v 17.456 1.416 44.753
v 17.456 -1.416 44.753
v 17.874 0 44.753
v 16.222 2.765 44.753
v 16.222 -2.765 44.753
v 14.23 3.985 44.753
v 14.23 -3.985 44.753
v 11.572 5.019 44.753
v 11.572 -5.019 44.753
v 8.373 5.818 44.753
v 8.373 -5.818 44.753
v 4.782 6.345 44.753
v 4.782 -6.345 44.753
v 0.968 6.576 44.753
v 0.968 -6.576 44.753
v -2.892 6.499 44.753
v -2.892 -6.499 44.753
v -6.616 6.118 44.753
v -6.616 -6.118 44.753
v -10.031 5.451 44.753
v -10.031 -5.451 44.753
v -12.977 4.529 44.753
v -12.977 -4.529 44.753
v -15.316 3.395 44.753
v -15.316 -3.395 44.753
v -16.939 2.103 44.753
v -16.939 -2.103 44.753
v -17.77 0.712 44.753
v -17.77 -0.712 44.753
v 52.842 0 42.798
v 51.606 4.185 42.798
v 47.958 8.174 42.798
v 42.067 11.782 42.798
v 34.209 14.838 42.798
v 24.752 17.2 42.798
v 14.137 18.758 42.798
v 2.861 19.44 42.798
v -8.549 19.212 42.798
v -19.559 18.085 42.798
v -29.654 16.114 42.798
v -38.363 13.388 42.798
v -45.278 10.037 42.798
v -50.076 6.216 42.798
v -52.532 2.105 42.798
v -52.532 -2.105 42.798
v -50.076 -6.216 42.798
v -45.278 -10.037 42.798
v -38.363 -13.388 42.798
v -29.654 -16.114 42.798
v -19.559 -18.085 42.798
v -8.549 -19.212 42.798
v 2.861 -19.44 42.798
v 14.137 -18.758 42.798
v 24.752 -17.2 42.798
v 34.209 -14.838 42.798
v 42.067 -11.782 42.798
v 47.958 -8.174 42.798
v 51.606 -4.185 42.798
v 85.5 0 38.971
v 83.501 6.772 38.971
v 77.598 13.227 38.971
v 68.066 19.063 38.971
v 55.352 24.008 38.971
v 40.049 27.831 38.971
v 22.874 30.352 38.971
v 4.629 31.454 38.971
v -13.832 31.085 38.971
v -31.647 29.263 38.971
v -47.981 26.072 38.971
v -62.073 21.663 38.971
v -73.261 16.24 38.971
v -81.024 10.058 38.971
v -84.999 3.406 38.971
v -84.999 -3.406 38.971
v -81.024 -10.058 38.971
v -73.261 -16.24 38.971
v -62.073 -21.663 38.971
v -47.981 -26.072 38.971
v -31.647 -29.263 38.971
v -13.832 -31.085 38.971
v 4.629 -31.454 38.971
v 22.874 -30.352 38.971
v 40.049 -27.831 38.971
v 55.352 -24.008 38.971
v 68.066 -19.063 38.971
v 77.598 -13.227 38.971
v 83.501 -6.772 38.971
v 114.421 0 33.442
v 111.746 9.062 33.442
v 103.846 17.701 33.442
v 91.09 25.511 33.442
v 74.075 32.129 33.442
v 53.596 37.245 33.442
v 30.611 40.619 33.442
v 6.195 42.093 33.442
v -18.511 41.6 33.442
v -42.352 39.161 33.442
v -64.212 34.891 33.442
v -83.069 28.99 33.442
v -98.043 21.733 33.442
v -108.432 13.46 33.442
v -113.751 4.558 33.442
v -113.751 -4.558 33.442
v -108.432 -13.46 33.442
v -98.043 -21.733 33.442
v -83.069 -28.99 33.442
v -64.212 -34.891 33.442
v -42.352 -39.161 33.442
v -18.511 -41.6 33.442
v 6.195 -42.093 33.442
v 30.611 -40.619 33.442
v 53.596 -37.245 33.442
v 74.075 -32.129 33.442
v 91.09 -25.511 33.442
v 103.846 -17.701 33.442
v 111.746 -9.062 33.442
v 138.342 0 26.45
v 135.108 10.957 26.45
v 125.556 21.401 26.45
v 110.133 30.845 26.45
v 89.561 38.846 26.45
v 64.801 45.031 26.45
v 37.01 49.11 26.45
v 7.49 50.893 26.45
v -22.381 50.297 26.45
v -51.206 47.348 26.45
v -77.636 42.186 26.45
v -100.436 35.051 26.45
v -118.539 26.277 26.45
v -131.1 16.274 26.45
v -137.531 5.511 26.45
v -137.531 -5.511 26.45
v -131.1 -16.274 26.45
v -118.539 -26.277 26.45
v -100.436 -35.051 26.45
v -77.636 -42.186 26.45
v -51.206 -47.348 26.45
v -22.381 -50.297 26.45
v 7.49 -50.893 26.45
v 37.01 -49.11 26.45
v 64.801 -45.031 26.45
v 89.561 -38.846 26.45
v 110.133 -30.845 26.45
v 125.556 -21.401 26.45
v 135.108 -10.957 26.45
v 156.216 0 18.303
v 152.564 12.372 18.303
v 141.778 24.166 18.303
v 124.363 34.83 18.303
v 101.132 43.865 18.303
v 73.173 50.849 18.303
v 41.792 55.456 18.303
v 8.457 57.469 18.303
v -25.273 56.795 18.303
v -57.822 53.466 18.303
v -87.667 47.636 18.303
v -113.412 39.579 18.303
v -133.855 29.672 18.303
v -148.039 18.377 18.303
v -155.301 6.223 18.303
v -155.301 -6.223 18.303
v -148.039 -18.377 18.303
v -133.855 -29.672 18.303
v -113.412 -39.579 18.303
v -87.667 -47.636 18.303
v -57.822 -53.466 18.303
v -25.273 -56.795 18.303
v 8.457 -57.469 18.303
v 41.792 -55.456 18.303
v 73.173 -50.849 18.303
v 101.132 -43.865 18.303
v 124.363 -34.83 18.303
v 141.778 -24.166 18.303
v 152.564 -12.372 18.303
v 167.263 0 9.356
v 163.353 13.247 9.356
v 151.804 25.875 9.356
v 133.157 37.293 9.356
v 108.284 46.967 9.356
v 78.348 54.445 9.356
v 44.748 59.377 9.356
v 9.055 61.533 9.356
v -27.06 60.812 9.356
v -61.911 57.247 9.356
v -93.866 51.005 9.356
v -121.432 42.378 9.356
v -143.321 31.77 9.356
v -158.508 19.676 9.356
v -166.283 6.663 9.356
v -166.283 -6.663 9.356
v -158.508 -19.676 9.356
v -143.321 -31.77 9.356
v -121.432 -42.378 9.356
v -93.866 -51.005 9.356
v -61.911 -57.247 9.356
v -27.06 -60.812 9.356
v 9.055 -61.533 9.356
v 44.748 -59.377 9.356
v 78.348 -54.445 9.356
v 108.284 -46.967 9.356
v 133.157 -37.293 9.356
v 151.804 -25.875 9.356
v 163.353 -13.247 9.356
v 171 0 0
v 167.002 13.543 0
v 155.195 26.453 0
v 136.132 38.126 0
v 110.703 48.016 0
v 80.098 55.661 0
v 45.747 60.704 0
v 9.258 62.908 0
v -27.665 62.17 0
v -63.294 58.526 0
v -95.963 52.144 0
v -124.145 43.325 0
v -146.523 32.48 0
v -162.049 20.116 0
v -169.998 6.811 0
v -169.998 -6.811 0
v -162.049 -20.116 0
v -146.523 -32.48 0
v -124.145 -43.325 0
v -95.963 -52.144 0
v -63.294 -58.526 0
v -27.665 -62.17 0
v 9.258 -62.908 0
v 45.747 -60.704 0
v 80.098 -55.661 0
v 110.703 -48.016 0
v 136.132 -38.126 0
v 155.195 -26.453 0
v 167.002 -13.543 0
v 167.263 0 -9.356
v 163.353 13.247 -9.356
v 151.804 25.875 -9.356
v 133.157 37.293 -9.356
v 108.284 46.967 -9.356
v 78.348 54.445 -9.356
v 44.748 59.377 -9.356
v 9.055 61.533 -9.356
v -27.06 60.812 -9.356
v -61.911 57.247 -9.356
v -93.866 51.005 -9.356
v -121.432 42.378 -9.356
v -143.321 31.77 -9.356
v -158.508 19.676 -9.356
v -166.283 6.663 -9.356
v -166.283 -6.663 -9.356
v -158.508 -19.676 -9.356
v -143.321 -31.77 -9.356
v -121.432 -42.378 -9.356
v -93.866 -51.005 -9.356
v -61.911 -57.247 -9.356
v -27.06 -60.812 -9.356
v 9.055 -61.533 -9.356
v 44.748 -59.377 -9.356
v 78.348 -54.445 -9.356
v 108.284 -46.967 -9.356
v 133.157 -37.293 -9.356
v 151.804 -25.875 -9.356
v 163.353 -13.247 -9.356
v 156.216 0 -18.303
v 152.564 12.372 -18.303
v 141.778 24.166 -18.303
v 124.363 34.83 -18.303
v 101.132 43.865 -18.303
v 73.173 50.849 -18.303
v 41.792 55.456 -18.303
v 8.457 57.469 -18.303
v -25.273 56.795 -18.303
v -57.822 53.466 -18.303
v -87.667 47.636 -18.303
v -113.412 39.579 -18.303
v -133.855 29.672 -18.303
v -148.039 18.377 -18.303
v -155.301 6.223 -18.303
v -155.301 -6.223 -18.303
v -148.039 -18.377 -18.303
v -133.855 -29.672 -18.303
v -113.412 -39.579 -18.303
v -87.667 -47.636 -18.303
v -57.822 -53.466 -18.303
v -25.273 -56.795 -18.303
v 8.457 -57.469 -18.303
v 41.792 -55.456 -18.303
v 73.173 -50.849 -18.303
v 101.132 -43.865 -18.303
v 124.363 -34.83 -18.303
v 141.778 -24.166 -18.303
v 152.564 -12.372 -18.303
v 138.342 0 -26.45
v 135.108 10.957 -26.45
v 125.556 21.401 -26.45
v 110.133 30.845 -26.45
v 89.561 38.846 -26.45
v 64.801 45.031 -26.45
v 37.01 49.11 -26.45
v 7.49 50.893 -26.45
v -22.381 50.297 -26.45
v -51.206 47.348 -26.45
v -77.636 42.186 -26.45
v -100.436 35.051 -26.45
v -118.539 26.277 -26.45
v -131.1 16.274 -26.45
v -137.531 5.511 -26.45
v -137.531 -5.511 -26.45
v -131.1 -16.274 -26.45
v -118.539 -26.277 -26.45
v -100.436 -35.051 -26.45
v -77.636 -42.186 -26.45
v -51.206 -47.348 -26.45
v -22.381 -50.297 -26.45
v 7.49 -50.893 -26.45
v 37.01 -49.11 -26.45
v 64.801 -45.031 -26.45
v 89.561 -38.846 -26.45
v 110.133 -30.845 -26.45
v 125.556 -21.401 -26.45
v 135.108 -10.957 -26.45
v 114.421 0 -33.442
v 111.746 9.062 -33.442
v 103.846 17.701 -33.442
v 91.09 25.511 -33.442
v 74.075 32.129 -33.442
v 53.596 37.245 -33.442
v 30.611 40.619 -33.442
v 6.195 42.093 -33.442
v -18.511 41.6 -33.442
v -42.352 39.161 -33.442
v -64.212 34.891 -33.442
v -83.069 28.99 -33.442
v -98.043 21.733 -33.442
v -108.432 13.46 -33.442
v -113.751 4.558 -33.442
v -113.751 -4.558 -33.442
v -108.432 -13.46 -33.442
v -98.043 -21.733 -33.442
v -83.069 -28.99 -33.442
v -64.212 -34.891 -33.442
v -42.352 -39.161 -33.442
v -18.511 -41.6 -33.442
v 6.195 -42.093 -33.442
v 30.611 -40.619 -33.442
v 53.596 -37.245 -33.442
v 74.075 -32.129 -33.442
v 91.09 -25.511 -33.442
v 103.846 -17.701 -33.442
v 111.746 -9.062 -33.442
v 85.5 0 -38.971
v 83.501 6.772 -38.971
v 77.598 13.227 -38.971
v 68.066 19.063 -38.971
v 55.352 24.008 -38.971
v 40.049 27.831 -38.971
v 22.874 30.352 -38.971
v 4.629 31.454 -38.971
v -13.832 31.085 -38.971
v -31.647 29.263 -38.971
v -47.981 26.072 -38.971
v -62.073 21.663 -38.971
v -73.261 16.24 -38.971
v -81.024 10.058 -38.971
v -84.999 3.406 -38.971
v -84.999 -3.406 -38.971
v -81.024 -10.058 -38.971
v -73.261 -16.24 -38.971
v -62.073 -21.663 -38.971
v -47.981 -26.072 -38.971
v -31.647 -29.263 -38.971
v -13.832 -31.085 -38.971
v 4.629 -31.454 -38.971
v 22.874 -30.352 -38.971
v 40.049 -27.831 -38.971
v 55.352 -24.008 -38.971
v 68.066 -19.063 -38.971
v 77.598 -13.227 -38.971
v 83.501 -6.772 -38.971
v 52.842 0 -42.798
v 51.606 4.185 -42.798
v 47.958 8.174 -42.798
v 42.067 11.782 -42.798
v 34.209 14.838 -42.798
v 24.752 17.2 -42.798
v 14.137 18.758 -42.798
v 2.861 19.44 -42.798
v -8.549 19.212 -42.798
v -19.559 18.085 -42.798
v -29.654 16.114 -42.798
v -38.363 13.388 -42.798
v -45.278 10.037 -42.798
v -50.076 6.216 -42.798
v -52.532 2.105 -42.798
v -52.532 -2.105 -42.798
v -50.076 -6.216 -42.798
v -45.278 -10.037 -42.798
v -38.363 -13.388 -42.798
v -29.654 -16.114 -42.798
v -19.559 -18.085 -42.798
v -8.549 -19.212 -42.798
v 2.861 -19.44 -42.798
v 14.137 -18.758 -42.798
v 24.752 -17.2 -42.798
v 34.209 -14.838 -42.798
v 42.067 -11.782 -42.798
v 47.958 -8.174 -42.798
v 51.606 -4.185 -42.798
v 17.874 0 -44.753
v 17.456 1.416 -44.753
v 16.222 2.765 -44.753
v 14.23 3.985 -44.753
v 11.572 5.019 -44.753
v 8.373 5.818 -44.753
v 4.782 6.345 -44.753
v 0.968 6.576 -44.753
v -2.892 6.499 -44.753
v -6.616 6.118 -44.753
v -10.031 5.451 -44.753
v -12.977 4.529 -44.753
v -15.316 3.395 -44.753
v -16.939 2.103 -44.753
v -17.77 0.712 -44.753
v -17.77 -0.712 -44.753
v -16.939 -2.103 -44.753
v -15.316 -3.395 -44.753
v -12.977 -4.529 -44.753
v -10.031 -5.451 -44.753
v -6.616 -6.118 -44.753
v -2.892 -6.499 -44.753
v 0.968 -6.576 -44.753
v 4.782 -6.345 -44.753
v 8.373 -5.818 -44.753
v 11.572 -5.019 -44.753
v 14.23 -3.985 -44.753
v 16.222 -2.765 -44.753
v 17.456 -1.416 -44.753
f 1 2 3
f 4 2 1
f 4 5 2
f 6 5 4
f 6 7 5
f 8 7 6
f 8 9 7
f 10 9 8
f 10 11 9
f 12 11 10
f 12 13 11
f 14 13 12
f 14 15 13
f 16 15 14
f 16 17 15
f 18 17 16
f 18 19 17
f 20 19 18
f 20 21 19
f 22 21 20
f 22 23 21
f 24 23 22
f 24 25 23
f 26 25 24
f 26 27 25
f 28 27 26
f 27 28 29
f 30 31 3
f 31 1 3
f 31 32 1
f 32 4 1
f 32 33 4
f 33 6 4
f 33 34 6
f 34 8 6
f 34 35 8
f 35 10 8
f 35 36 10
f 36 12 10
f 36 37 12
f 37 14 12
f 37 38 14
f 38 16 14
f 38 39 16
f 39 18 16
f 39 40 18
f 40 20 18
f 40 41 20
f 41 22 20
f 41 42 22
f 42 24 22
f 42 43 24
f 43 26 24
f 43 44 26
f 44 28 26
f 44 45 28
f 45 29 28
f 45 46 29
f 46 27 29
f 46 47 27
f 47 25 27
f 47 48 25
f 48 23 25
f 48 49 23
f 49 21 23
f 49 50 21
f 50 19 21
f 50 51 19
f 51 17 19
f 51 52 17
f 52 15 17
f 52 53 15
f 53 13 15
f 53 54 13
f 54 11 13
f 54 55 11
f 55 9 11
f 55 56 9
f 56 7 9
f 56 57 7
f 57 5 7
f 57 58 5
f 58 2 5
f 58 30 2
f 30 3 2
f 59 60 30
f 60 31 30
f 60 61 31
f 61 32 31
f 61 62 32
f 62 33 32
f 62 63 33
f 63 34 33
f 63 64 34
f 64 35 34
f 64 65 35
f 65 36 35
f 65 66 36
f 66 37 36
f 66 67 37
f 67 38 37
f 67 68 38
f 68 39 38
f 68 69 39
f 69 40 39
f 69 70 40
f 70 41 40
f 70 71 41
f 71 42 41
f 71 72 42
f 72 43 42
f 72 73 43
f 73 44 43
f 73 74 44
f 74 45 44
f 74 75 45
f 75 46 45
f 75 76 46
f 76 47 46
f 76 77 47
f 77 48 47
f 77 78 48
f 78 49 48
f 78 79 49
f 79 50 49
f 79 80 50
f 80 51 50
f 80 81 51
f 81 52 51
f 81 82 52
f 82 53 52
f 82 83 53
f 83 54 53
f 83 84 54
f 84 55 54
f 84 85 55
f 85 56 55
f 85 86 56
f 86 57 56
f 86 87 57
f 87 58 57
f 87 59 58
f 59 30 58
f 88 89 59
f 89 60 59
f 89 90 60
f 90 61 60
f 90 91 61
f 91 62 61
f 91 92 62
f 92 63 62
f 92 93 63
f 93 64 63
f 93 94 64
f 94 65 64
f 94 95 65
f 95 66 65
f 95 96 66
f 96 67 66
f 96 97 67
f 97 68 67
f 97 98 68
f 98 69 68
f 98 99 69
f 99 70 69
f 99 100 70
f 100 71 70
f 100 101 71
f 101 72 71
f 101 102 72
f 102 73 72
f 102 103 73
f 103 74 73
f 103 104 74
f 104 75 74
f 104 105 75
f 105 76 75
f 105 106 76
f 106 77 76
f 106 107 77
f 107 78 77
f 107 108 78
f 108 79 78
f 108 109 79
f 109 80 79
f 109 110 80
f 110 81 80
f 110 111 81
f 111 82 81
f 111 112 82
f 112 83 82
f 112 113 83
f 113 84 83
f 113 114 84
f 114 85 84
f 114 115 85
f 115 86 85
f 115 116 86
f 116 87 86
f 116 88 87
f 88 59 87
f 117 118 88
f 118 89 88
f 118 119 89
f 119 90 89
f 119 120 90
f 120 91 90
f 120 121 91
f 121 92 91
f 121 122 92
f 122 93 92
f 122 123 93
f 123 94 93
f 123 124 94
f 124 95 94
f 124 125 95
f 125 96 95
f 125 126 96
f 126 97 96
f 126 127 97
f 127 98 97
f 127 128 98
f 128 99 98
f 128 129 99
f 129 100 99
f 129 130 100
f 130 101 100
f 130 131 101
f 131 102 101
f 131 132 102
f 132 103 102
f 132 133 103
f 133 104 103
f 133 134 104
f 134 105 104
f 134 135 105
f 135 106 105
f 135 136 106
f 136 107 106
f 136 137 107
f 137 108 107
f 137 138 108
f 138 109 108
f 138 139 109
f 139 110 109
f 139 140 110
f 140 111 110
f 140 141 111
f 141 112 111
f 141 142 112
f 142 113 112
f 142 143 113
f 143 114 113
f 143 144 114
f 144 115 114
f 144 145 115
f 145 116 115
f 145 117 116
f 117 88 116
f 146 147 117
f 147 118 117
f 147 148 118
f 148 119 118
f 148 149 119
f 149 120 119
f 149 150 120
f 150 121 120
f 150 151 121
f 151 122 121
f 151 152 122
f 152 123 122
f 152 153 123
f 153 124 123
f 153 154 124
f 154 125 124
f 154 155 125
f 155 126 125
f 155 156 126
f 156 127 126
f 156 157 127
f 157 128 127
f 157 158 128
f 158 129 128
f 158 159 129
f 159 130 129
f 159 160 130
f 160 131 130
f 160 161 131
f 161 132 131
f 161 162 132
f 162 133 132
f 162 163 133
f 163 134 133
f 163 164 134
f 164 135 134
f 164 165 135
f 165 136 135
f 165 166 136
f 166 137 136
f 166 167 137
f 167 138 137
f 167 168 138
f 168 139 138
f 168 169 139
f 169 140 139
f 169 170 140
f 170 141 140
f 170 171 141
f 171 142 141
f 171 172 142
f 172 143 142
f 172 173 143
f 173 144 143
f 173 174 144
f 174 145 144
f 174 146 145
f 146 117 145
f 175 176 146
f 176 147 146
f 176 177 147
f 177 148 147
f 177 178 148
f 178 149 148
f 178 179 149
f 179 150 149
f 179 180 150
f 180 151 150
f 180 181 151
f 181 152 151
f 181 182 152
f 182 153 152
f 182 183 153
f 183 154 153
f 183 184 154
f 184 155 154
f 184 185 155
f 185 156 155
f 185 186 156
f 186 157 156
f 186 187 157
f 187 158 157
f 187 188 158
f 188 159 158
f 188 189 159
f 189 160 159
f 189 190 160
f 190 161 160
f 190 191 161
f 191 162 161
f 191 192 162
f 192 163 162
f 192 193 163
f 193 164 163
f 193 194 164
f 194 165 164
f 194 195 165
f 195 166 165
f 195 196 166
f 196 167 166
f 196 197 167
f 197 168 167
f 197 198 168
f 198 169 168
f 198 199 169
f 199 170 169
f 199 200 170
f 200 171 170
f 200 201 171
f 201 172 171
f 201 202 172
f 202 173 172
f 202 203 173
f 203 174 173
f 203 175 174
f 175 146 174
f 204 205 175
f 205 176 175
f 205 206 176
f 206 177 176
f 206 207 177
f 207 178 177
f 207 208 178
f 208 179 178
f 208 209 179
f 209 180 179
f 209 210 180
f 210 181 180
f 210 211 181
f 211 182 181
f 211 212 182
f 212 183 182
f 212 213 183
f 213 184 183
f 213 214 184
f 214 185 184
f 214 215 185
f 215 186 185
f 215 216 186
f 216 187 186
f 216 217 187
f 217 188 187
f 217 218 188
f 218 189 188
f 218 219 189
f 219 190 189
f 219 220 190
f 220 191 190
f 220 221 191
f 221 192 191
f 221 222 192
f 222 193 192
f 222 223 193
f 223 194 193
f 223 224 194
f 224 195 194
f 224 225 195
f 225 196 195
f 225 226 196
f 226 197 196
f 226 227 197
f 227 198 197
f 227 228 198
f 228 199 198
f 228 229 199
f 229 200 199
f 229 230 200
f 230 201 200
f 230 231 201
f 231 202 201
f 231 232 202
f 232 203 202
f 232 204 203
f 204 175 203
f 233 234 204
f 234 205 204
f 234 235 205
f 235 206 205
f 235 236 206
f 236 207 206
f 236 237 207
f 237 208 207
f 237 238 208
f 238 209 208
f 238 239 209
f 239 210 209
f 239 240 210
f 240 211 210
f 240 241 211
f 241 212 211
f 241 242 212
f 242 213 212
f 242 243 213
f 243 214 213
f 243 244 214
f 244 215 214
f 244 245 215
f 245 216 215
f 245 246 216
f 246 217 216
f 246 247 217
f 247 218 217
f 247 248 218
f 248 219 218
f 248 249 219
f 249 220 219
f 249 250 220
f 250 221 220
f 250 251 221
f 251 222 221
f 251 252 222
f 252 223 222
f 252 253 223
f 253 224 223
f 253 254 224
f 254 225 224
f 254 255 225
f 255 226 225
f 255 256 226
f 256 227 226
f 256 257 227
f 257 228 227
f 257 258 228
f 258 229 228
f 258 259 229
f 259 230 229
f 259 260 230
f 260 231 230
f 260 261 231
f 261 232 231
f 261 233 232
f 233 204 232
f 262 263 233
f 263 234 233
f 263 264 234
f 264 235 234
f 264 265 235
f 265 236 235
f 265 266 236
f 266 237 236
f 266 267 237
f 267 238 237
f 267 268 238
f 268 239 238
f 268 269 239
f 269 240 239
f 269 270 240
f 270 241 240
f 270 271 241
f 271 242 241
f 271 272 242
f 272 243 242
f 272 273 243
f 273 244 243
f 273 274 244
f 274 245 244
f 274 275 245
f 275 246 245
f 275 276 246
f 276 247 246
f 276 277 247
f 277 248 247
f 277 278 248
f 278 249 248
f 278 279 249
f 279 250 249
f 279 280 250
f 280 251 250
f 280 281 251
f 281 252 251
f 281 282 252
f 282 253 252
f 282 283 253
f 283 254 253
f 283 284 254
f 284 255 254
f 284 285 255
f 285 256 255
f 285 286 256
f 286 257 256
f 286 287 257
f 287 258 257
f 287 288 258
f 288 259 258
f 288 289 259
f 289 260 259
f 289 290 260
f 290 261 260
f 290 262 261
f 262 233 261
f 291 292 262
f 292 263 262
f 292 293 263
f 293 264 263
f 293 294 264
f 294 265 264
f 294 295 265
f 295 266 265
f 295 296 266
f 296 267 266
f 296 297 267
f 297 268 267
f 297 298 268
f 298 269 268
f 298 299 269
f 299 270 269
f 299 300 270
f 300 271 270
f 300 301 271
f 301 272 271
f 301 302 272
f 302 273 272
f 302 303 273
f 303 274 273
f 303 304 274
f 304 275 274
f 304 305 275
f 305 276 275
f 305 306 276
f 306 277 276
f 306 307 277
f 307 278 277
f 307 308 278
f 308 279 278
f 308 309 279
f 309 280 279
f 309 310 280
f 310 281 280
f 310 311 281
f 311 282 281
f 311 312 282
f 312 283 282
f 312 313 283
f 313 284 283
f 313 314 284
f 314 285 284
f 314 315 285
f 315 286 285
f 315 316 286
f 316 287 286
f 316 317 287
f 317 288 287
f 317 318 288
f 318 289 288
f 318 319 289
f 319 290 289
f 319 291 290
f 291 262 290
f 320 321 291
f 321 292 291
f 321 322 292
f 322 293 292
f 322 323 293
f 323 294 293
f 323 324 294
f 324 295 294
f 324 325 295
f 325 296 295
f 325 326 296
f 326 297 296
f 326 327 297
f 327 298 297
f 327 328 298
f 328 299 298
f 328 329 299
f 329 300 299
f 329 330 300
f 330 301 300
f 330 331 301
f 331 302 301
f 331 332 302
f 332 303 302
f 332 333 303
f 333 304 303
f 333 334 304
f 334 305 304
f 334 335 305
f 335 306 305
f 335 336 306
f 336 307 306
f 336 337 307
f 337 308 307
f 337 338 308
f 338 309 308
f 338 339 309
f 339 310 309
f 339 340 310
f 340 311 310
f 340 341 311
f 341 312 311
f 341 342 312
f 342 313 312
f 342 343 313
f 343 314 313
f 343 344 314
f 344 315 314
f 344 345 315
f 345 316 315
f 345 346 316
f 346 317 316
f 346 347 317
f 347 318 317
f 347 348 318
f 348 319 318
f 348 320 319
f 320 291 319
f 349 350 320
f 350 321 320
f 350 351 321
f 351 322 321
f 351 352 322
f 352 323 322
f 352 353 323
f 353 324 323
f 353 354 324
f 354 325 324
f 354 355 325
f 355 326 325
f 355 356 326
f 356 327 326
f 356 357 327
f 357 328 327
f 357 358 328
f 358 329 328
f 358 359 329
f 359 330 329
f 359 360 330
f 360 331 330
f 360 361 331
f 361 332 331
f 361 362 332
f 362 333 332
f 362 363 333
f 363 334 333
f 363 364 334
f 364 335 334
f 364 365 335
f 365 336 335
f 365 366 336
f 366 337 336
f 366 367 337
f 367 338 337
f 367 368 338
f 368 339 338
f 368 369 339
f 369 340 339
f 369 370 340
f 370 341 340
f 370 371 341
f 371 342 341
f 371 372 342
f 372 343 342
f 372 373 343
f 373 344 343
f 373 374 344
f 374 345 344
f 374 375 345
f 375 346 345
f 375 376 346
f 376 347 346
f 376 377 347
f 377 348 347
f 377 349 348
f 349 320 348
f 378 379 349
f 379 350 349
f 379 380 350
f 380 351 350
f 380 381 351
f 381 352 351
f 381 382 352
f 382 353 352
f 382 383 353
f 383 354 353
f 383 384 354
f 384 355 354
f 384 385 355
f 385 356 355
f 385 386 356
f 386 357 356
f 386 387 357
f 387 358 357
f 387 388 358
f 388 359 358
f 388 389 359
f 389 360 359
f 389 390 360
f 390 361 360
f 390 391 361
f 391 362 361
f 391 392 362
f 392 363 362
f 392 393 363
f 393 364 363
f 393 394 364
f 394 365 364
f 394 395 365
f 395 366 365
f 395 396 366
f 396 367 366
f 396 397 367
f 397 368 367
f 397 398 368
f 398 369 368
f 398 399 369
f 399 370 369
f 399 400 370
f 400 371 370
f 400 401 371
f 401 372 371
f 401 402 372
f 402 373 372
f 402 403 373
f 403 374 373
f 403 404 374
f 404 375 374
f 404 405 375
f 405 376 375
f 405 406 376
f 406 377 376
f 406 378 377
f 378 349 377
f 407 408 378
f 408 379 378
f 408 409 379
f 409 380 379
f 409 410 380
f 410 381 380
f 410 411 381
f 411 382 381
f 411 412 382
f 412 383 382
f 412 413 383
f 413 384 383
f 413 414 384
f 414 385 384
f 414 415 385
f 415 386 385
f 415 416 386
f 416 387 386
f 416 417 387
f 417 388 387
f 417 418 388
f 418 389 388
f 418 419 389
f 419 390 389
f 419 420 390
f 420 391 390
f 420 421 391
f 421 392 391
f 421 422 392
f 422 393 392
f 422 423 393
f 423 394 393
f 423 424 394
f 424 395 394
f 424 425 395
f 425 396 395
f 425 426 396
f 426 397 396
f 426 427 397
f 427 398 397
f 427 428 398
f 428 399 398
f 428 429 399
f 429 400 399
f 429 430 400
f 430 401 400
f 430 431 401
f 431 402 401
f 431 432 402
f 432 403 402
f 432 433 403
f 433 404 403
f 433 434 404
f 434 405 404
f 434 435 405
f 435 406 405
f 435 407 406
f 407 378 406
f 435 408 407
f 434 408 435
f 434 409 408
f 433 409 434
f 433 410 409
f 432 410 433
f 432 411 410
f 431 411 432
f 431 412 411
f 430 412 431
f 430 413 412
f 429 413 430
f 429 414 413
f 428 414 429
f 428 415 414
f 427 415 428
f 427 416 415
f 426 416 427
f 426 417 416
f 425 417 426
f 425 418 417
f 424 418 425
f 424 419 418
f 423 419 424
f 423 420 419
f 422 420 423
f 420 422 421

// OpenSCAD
// Generated by SolidPython 1.0.1 on 2020-07-29 00:46:53


scale(v = [19, 7, 5]) {
	sphere(r = 9);
}
/***********************************************
*********      SolidPython code:      **********
************************************************
 
# import packages: SolidPython
from solid import *
from solid.utils import *
from itertools import chain, combinations, permutations


class Resize:

    def __init__(self, scad_file):
        self.scad_file = scad_file
        #self.scad_file = import_scad(scad_file)
        # cone/cylinder param:
        self.r1 = 0
        self.r2 = 0
        self.h = 0
        # rectangular prism param:
        self.w = 0
        self.l = 0
        # ellipse param:
        self.r = 0

    # import OpenScad code (file name corresponds to shape)


    # classify shape + parameters
    def assign(self, param1, param2, param3):
        if self.scad_file == 'cone.scad':
            self.r1 = param1
            self.r2 = param2
            self.h = param3
        elif self.scad_file == 'cylinder.scad':
            self.r1 = param1
            self.r2 = param2
            self.h = param3
        elif self.scad_file == 'rectangularPrism.scad':
            self.h = param1
            self.l = param2
            self.w = param3
        else:
            self.r = param1
            self.h = param2

    # resize parameters
    def iterate(self):
        x = range(3, 20, 2)
        i = 1
        if self.scad_file == 'cone.scad':
            tempList = list(permutations(x, 2))
            for temp in tempList:
                param1 = temp[0]
                param2 = temp[1]
                filepath = 'produced_scad_files/' + 'cone' + str(param1) + '_' + str(param2) + '_' + '.scad'
                scad_render_to_file(cylinder(h=param1, r1=param2, r2=0), filepath)

        elif self.scad_file == 'cylinder.scad':
            tempList = list(permutations(x, 3))
            for temp in tempList:
                param1 = temp[0]
                param2 = temp[1]
                filepath = 'produced_scad_files/' + 'cylinder' + str(param1) + '_' + str(param2) + '_' + '.scad'
                scad_render_to_file(cylinder(h=param1, r1=param2, r2=param2), filepath)

        elif self.scad_file == 'rectangularPrism.scad':
            tempList = list(permutations(x, 3))
            for temp in tempList:
                param1 = temp[0]
                param2 = temp[1]
                param3 = temp[2]
                filepath = 'produced_scad_files/' + 'rectangularPrism' + str(param1) + '_' + str(param2) + '_' + str(
                    param3) + '.scad'
                scad_render_to_file(cube(size=(param1, param2, param3)), filepath)

        elif self.scad_file == 'ellipse.scad':
            tempList = list(permutations(x, 4))
            for temp in tempList:
                param1 = temp[0]
                param2 = temp[1]
                param3 = temp[2]
                param4 = temp[3]
                filepath = 'produced_scad_files/' + 'ellipse' + str(param1) + '_' + str(param2) + '_' + str(param3) + '_' + str(param4) + '.scad'
                scad_render_to_file(scale([param1, param2, param3])(sphere(r=param4)), filepath)

    def render_to_scadfile(self):
        scad_render_to_file(scad, 'example.scad') 
 
************************************************/
